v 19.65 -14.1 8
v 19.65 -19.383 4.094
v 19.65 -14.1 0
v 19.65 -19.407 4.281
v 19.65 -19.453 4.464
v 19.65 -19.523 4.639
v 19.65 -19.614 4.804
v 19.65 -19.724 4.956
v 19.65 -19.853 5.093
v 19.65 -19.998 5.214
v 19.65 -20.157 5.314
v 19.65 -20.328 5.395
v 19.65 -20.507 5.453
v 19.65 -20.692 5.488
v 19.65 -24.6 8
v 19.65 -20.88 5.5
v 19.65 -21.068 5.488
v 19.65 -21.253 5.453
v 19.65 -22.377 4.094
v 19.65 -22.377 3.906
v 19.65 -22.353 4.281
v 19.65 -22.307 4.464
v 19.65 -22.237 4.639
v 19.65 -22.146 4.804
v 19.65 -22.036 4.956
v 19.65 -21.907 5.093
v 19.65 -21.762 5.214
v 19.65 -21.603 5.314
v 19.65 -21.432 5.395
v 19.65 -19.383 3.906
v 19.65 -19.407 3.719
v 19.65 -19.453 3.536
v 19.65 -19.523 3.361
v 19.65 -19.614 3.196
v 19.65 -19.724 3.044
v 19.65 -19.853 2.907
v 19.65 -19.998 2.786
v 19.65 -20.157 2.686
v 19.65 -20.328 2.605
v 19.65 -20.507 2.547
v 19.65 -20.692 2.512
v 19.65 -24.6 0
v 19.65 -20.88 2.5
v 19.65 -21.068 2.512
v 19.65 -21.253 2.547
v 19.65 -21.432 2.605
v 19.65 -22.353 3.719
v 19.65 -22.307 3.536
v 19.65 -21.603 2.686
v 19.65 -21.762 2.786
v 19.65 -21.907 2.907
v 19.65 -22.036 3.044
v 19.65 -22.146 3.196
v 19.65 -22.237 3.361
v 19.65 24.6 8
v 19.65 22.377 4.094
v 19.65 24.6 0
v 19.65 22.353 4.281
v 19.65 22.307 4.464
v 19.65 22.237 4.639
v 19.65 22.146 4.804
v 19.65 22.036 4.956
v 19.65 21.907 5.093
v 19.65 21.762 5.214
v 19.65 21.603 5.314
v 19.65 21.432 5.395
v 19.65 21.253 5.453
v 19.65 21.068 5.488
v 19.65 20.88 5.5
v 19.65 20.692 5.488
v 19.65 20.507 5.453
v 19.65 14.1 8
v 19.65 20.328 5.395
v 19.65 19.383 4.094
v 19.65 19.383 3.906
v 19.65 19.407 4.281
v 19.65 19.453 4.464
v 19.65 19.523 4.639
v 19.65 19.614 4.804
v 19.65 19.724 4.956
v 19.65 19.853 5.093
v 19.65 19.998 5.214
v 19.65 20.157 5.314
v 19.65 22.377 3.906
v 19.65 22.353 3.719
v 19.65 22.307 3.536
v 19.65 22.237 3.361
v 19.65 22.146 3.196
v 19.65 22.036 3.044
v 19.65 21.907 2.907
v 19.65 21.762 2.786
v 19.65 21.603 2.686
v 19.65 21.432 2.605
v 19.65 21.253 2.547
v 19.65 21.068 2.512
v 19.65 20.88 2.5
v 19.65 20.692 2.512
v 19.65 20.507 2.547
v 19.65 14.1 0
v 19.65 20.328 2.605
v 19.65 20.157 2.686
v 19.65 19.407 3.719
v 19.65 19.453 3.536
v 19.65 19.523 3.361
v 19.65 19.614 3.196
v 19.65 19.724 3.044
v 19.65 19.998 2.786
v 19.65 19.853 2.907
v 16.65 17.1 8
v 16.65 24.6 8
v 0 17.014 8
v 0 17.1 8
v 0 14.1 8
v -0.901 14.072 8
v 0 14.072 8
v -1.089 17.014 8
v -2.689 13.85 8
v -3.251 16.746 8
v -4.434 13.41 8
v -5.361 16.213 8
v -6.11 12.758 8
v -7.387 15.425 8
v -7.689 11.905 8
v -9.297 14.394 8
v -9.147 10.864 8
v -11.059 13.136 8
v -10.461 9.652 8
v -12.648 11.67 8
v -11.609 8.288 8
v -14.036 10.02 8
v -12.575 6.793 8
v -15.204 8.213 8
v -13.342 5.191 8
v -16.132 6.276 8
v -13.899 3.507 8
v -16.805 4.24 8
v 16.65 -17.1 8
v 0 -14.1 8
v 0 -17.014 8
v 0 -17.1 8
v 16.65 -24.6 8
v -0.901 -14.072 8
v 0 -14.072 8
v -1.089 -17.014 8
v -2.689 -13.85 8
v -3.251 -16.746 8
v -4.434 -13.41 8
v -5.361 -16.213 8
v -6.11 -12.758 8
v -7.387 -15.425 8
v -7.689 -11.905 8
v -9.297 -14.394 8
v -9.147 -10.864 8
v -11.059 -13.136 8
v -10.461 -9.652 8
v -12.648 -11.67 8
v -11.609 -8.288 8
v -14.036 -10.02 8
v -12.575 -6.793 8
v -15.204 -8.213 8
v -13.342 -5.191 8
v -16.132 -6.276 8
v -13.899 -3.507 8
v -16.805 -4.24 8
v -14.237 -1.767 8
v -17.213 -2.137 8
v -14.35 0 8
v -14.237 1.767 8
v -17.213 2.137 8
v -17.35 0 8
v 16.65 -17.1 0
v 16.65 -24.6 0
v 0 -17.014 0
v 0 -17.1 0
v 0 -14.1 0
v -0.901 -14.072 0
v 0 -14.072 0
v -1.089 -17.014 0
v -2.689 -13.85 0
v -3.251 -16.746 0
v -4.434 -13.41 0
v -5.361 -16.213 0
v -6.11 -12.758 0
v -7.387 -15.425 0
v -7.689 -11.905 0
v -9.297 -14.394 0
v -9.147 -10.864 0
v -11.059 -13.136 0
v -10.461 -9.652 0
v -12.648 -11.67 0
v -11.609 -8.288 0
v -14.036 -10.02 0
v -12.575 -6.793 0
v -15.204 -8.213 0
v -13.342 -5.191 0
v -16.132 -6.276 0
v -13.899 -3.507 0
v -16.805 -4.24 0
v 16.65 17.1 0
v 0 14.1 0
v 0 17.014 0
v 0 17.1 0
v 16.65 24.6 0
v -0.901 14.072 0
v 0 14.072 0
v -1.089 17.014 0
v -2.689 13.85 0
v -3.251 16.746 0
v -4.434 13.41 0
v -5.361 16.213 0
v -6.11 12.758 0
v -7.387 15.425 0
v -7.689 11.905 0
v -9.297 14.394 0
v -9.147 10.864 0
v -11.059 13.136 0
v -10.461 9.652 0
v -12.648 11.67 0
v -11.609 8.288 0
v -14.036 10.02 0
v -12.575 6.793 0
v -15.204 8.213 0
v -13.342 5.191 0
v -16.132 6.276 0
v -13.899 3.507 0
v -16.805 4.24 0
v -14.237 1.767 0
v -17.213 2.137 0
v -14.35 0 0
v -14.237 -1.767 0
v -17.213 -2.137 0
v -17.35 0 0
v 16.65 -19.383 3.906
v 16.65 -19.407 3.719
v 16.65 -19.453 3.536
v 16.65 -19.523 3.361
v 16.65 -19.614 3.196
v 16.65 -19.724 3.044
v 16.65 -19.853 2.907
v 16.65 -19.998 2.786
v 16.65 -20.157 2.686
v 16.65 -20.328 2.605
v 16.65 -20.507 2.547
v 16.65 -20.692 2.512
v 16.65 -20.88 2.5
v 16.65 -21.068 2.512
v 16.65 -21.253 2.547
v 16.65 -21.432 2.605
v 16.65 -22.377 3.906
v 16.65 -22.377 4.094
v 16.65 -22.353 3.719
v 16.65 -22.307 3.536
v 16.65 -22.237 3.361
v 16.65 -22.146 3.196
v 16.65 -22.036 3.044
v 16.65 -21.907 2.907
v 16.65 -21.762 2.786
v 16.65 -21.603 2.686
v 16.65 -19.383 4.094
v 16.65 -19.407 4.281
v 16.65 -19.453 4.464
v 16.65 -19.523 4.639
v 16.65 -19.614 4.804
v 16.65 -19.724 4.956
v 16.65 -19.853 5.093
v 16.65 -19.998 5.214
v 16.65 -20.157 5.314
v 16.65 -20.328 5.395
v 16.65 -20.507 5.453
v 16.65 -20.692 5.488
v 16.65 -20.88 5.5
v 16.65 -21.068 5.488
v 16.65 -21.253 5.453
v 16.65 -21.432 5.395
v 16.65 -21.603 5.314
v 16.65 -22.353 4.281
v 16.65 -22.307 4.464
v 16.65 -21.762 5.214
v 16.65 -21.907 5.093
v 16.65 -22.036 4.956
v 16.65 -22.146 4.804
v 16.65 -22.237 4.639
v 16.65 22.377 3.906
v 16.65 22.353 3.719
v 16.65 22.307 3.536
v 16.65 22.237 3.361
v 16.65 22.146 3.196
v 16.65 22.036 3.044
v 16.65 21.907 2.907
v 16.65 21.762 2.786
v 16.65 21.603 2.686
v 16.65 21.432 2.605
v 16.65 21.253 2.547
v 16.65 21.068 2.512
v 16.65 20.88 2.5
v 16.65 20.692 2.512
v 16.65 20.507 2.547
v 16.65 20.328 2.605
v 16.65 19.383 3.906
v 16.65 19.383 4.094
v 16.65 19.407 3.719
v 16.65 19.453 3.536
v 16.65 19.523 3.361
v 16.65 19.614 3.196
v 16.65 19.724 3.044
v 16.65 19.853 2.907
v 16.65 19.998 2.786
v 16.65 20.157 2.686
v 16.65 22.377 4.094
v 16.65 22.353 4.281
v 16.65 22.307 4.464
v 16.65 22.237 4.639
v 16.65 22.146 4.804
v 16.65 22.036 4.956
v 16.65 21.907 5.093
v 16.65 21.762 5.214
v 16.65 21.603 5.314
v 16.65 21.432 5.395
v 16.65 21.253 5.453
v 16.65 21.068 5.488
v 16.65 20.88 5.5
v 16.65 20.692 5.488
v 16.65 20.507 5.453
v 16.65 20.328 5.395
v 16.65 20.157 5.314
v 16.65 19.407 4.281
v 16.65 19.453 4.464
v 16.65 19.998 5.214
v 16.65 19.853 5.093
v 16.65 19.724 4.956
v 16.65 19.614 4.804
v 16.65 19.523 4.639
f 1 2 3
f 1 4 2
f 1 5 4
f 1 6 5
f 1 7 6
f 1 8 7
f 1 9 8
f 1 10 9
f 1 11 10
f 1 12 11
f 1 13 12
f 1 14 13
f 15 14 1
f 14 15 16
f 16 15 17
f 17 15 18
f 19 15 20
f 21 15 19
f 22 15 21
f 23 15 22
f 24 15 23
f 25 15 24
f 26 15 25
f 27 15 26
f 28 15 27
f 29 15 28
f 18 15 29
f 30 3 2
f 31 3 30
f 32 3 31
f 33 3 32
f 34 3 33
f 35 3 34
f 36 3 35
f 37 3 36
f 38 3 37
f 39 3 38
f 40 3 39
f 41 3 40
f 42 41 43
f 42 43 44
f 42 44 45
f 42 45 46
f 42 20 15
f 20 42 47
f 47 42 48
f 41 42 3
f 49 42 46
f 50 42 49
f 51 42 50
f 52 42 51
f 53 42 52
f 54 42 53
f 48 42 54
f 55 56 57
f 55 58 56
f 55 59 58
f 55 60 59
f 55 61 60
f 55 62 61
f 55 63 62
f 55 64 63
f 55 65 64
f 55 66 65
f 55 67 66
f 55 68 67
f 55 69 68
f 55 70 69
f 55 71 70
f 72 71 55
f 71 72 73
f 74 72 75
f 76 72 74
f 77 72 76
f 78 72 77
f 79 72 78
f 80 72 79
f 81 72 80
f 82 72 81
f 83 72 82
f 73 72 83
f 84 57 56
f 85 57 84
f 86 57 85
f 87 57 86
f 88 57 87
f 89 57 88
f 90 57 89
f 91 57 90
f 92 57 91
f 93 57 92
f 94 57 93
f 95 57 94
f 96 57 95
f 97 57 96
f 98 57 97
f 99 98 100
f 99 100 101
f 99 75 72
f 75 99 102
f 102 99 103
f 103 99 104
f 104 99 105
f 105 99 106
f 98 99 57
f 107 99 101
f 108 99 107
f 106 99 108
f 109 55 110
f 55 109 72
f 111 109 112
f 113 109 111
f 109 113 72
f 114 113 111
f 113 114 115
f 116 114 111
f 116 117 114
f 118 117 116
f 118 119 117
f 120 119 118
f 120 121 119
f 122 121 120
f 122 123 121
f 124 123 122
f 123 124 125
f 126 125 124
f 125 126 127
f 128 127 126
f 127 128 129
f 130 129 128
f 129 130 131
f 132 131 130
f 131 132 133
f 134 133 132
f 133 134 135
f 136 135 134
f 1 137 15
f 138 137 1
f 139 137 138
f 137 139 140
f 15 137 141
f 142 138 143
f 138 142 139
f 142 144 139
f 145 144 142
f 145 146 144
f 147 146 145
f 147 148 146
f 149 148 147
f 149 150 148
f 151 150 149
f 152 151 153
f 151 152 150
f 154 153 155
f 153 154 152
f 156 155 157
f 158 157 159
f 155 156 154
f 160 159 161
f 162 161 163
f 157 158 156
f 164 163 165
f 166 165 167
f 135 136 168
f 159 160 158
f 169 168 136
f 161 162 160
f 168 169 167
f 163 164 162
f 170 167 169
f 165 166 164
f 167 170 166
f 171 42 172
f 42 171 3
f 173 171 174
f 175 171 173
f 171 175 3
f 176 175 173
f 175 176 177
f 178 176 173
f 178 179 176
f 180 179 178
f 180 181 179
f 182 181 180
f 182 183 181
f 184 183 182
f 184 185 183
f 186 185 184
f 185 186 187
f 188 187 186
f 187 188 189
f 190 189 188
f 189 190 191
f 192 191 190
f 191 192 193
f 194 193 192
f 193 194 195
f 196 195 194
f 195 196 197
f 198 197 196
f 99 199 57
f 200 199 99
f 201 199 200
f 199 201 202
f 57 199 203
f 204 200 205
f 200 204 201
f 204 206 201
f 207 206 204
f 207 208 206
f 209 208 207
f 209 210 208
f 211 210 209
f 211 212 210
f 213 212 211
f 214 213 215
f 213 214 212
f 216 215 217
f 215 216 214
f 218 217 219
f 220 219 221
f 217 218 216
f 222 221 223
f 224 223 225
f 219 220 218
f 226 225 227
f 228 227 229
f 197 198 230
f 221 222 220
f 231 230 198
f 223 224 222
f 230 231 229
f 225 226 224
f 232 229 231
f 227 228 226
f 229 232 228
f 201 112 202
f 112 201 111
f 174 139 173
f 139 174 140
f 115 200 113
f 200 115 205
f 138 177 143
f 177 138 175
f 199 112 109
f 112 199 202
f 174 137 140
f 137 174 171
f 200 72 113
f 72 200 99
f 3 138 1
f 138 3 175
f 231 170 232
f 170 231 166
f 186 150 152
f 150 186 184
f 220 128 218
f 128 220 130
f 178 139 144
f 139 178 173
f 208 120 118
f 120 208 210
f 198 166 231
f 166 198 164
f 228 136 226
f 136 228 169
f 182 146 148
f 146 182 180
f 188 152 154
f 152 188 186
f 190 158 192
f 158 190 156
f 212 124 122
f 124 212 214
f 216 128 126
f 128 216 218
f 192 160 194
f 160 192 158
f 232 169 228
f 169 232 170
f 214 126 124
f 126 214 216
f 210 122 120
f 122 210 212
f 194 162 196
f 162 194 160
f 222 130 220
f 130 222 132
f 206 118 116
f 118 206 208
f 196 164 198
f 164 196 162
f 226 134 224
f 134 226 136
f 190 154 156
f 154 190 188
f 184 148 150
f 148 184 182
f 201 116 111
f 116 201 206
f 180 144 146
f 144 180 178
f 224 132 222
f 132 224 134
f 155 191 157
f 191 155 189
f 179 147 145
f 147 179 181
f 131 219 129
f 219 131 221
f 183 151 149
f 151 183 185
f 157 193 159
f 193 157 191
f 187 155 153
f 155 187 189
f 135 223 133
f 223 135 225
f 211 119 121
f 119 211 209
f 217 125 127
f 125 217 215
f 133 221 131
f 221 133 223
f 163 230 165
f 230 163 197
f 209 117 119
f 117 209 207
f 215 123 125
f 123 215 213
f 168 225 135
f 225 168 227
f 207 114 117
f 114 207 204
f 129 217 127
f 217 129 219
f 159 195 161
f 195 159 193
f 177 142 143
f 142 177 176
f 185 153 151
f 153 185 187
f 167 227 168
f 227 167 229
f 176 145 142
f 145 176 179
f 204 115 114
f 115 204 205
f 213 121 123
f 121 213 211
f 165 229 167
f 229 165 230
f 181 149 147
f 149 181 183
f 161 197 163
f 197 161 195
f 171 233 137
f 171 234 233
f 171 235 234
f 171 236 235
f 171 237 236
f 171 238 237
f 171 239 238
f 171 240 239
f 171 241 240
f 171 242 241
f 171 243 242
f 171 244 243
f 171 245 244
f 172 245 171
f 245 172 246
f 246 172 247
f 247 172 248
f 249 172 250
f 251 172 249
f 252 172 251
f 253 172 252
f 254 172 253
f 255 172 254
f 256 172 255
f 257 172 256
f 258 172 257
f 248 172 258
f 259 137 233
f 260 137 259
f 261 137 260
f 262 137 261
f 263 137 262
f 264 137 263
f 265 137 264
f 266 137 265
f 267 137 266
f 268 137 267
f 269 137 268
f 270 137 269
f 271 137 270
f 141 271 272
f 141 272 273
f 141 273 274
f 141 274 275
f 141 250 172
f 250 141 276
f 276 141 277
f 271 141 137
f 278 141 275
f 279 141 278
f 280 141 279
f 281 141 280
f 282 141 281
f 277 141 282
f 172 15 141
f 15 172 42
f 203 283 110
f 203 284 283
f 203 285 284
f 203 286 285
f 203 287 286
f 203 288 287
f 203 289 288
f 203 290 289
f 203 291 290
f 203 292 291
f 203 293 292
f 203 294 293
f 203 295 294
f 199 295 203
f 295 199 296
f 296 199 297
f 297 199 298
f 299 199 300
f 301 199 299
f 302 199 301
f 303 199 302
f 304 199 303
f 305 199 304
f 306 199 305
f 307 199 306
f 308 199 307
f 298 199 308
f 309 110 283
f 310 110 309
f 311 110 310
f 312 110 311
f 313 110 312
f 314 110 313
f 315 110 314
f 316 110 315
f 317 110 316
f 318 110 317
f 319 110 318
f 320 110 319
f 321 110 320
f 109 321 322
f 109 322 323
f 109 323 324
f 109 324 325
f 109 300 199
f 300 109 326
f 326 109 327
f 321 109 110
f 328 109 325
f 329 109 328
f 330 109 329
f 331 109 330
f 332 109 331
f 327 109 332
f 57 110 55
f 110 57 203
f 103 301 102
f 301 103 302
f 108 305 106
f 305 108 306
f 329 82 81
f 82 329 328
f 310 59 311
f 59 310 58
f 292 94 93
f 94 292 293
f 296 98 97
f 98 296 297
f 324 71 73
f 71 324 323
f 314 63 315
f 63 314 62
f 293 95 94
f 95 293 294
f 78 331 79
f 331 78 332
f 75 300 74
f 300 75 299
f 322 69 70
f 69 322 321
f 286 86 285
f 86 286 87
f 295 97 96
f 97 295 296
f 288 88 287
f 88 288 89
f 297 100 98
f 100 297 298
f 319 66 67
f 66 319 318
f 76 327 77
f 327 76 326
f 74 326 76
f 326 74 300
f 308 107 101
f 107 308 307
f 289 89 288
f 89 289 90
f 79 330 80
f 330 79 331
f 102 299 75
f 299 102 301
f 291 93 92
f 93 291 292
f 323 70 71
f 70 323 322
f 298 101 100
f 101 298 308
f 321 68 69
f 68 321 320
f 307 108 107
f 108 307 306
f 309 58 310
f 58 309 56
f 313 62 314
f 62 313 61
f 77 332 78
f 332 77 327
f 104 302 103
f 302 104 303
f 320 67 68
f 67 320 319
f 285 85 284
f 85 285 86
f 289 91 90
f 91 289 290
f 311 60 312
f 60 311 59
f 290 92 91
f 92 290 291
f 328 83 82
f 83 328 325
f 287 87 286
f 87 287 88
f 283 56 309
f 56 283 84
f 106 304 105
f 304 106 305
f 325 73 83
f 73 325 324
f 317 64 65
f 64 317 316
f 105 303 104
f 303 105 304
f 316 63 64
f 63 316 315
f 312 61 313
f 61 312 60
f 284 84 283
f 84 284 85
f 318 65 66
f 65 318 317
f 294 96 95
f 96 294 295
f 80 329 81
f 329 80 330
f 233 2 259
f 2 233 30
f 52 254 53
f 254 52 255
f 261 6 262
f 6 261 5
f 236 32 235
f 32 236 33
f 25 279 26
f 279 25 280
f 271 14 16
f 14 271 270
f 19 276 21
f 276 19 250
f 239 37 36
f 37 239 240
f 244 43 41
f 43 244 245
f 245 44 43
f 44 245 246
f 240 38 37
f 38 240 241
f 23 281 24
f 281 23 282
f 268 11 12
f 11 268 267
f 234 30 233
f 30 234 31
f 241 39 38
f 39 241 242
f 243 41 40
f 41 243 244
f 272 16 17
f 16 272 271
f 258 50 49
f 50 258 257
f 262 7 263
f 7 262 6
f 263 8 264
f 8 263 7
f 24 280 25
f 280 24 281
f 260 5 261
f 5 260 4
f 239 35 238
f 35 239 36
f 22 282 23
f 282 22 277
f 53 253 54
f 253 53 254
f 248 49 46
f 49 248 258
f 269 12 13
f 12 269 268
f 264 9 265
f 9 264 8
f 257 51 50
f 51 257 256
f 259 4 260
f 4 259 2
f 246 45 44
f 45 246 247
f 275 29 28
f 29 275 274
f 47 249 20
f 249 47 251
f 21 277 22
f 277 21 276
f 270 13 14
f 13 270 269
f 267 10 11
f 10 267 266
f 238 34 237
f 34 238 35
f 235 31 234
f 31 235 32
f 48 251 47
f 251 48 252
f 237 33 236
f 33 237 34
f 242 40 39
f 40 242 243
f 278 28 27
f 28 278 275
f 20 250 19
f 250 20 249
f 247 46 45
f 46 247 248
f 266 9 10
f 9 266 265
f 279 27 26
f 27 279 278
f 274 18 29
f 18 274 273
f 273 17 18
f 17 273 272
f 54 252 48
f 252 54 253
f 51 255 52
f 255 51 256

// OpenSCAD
r = 28.7;
tot_h = 34;
r_in = 28.2;
scal_fact = 28.2/28.7;
thick = 3;
height = 8;
r_out = r+2*thick;
difference() {
	union() {
		// Base for screws
		translate([tot_h-r/2-thick, -(r_in+thick)/2-height-1, 0]) cube([thick, height+2, height]);
		mirror([0,1,0]) translate([tot_h-r/2-thick, -(r_in+thick)/2-height-1, 0]) cube([thick, height+2, height]);
		// Borders rect cubes
		difference() {
			translate([0, -(r_in/2+thick), 0]) cube([tot_h-r/2, (r_in+2*thick), height], center=false);
			translate([0, -r_in/2, 0]) cube([(tot_h-r/2+10), (r_in), height], center=false);
		};
		
		// Border top cylinder
		scale([1, scal_fact, 1])
			difference() {
				cylinder(h=height,r=r_out/2,$fn=50);
				cylinder(h=height,r=r/2,$fn=50);
				translate([0, -(r_out+1)/2, 0]) cube([(r_out+1), 2*(r_out+1), height], center=false);
			};
	};


	mirror([0,1,0]) translate([tot_h-r/2-thick-1, -(r_in+thick)/2-0.66*height, 0.5*height])
		rotate([0, 90, 0])
		cylinder(h=2*thick+1,r=1.5,$fn=50);

	translate([tot_h-r/2-thick-1, -(r_in+thick)/2-0.66*height, 0.5*height])
		rotate([0, 90, 0])
		cylinder(h=2*thick+1,r=1.5,$fn=50);
};
